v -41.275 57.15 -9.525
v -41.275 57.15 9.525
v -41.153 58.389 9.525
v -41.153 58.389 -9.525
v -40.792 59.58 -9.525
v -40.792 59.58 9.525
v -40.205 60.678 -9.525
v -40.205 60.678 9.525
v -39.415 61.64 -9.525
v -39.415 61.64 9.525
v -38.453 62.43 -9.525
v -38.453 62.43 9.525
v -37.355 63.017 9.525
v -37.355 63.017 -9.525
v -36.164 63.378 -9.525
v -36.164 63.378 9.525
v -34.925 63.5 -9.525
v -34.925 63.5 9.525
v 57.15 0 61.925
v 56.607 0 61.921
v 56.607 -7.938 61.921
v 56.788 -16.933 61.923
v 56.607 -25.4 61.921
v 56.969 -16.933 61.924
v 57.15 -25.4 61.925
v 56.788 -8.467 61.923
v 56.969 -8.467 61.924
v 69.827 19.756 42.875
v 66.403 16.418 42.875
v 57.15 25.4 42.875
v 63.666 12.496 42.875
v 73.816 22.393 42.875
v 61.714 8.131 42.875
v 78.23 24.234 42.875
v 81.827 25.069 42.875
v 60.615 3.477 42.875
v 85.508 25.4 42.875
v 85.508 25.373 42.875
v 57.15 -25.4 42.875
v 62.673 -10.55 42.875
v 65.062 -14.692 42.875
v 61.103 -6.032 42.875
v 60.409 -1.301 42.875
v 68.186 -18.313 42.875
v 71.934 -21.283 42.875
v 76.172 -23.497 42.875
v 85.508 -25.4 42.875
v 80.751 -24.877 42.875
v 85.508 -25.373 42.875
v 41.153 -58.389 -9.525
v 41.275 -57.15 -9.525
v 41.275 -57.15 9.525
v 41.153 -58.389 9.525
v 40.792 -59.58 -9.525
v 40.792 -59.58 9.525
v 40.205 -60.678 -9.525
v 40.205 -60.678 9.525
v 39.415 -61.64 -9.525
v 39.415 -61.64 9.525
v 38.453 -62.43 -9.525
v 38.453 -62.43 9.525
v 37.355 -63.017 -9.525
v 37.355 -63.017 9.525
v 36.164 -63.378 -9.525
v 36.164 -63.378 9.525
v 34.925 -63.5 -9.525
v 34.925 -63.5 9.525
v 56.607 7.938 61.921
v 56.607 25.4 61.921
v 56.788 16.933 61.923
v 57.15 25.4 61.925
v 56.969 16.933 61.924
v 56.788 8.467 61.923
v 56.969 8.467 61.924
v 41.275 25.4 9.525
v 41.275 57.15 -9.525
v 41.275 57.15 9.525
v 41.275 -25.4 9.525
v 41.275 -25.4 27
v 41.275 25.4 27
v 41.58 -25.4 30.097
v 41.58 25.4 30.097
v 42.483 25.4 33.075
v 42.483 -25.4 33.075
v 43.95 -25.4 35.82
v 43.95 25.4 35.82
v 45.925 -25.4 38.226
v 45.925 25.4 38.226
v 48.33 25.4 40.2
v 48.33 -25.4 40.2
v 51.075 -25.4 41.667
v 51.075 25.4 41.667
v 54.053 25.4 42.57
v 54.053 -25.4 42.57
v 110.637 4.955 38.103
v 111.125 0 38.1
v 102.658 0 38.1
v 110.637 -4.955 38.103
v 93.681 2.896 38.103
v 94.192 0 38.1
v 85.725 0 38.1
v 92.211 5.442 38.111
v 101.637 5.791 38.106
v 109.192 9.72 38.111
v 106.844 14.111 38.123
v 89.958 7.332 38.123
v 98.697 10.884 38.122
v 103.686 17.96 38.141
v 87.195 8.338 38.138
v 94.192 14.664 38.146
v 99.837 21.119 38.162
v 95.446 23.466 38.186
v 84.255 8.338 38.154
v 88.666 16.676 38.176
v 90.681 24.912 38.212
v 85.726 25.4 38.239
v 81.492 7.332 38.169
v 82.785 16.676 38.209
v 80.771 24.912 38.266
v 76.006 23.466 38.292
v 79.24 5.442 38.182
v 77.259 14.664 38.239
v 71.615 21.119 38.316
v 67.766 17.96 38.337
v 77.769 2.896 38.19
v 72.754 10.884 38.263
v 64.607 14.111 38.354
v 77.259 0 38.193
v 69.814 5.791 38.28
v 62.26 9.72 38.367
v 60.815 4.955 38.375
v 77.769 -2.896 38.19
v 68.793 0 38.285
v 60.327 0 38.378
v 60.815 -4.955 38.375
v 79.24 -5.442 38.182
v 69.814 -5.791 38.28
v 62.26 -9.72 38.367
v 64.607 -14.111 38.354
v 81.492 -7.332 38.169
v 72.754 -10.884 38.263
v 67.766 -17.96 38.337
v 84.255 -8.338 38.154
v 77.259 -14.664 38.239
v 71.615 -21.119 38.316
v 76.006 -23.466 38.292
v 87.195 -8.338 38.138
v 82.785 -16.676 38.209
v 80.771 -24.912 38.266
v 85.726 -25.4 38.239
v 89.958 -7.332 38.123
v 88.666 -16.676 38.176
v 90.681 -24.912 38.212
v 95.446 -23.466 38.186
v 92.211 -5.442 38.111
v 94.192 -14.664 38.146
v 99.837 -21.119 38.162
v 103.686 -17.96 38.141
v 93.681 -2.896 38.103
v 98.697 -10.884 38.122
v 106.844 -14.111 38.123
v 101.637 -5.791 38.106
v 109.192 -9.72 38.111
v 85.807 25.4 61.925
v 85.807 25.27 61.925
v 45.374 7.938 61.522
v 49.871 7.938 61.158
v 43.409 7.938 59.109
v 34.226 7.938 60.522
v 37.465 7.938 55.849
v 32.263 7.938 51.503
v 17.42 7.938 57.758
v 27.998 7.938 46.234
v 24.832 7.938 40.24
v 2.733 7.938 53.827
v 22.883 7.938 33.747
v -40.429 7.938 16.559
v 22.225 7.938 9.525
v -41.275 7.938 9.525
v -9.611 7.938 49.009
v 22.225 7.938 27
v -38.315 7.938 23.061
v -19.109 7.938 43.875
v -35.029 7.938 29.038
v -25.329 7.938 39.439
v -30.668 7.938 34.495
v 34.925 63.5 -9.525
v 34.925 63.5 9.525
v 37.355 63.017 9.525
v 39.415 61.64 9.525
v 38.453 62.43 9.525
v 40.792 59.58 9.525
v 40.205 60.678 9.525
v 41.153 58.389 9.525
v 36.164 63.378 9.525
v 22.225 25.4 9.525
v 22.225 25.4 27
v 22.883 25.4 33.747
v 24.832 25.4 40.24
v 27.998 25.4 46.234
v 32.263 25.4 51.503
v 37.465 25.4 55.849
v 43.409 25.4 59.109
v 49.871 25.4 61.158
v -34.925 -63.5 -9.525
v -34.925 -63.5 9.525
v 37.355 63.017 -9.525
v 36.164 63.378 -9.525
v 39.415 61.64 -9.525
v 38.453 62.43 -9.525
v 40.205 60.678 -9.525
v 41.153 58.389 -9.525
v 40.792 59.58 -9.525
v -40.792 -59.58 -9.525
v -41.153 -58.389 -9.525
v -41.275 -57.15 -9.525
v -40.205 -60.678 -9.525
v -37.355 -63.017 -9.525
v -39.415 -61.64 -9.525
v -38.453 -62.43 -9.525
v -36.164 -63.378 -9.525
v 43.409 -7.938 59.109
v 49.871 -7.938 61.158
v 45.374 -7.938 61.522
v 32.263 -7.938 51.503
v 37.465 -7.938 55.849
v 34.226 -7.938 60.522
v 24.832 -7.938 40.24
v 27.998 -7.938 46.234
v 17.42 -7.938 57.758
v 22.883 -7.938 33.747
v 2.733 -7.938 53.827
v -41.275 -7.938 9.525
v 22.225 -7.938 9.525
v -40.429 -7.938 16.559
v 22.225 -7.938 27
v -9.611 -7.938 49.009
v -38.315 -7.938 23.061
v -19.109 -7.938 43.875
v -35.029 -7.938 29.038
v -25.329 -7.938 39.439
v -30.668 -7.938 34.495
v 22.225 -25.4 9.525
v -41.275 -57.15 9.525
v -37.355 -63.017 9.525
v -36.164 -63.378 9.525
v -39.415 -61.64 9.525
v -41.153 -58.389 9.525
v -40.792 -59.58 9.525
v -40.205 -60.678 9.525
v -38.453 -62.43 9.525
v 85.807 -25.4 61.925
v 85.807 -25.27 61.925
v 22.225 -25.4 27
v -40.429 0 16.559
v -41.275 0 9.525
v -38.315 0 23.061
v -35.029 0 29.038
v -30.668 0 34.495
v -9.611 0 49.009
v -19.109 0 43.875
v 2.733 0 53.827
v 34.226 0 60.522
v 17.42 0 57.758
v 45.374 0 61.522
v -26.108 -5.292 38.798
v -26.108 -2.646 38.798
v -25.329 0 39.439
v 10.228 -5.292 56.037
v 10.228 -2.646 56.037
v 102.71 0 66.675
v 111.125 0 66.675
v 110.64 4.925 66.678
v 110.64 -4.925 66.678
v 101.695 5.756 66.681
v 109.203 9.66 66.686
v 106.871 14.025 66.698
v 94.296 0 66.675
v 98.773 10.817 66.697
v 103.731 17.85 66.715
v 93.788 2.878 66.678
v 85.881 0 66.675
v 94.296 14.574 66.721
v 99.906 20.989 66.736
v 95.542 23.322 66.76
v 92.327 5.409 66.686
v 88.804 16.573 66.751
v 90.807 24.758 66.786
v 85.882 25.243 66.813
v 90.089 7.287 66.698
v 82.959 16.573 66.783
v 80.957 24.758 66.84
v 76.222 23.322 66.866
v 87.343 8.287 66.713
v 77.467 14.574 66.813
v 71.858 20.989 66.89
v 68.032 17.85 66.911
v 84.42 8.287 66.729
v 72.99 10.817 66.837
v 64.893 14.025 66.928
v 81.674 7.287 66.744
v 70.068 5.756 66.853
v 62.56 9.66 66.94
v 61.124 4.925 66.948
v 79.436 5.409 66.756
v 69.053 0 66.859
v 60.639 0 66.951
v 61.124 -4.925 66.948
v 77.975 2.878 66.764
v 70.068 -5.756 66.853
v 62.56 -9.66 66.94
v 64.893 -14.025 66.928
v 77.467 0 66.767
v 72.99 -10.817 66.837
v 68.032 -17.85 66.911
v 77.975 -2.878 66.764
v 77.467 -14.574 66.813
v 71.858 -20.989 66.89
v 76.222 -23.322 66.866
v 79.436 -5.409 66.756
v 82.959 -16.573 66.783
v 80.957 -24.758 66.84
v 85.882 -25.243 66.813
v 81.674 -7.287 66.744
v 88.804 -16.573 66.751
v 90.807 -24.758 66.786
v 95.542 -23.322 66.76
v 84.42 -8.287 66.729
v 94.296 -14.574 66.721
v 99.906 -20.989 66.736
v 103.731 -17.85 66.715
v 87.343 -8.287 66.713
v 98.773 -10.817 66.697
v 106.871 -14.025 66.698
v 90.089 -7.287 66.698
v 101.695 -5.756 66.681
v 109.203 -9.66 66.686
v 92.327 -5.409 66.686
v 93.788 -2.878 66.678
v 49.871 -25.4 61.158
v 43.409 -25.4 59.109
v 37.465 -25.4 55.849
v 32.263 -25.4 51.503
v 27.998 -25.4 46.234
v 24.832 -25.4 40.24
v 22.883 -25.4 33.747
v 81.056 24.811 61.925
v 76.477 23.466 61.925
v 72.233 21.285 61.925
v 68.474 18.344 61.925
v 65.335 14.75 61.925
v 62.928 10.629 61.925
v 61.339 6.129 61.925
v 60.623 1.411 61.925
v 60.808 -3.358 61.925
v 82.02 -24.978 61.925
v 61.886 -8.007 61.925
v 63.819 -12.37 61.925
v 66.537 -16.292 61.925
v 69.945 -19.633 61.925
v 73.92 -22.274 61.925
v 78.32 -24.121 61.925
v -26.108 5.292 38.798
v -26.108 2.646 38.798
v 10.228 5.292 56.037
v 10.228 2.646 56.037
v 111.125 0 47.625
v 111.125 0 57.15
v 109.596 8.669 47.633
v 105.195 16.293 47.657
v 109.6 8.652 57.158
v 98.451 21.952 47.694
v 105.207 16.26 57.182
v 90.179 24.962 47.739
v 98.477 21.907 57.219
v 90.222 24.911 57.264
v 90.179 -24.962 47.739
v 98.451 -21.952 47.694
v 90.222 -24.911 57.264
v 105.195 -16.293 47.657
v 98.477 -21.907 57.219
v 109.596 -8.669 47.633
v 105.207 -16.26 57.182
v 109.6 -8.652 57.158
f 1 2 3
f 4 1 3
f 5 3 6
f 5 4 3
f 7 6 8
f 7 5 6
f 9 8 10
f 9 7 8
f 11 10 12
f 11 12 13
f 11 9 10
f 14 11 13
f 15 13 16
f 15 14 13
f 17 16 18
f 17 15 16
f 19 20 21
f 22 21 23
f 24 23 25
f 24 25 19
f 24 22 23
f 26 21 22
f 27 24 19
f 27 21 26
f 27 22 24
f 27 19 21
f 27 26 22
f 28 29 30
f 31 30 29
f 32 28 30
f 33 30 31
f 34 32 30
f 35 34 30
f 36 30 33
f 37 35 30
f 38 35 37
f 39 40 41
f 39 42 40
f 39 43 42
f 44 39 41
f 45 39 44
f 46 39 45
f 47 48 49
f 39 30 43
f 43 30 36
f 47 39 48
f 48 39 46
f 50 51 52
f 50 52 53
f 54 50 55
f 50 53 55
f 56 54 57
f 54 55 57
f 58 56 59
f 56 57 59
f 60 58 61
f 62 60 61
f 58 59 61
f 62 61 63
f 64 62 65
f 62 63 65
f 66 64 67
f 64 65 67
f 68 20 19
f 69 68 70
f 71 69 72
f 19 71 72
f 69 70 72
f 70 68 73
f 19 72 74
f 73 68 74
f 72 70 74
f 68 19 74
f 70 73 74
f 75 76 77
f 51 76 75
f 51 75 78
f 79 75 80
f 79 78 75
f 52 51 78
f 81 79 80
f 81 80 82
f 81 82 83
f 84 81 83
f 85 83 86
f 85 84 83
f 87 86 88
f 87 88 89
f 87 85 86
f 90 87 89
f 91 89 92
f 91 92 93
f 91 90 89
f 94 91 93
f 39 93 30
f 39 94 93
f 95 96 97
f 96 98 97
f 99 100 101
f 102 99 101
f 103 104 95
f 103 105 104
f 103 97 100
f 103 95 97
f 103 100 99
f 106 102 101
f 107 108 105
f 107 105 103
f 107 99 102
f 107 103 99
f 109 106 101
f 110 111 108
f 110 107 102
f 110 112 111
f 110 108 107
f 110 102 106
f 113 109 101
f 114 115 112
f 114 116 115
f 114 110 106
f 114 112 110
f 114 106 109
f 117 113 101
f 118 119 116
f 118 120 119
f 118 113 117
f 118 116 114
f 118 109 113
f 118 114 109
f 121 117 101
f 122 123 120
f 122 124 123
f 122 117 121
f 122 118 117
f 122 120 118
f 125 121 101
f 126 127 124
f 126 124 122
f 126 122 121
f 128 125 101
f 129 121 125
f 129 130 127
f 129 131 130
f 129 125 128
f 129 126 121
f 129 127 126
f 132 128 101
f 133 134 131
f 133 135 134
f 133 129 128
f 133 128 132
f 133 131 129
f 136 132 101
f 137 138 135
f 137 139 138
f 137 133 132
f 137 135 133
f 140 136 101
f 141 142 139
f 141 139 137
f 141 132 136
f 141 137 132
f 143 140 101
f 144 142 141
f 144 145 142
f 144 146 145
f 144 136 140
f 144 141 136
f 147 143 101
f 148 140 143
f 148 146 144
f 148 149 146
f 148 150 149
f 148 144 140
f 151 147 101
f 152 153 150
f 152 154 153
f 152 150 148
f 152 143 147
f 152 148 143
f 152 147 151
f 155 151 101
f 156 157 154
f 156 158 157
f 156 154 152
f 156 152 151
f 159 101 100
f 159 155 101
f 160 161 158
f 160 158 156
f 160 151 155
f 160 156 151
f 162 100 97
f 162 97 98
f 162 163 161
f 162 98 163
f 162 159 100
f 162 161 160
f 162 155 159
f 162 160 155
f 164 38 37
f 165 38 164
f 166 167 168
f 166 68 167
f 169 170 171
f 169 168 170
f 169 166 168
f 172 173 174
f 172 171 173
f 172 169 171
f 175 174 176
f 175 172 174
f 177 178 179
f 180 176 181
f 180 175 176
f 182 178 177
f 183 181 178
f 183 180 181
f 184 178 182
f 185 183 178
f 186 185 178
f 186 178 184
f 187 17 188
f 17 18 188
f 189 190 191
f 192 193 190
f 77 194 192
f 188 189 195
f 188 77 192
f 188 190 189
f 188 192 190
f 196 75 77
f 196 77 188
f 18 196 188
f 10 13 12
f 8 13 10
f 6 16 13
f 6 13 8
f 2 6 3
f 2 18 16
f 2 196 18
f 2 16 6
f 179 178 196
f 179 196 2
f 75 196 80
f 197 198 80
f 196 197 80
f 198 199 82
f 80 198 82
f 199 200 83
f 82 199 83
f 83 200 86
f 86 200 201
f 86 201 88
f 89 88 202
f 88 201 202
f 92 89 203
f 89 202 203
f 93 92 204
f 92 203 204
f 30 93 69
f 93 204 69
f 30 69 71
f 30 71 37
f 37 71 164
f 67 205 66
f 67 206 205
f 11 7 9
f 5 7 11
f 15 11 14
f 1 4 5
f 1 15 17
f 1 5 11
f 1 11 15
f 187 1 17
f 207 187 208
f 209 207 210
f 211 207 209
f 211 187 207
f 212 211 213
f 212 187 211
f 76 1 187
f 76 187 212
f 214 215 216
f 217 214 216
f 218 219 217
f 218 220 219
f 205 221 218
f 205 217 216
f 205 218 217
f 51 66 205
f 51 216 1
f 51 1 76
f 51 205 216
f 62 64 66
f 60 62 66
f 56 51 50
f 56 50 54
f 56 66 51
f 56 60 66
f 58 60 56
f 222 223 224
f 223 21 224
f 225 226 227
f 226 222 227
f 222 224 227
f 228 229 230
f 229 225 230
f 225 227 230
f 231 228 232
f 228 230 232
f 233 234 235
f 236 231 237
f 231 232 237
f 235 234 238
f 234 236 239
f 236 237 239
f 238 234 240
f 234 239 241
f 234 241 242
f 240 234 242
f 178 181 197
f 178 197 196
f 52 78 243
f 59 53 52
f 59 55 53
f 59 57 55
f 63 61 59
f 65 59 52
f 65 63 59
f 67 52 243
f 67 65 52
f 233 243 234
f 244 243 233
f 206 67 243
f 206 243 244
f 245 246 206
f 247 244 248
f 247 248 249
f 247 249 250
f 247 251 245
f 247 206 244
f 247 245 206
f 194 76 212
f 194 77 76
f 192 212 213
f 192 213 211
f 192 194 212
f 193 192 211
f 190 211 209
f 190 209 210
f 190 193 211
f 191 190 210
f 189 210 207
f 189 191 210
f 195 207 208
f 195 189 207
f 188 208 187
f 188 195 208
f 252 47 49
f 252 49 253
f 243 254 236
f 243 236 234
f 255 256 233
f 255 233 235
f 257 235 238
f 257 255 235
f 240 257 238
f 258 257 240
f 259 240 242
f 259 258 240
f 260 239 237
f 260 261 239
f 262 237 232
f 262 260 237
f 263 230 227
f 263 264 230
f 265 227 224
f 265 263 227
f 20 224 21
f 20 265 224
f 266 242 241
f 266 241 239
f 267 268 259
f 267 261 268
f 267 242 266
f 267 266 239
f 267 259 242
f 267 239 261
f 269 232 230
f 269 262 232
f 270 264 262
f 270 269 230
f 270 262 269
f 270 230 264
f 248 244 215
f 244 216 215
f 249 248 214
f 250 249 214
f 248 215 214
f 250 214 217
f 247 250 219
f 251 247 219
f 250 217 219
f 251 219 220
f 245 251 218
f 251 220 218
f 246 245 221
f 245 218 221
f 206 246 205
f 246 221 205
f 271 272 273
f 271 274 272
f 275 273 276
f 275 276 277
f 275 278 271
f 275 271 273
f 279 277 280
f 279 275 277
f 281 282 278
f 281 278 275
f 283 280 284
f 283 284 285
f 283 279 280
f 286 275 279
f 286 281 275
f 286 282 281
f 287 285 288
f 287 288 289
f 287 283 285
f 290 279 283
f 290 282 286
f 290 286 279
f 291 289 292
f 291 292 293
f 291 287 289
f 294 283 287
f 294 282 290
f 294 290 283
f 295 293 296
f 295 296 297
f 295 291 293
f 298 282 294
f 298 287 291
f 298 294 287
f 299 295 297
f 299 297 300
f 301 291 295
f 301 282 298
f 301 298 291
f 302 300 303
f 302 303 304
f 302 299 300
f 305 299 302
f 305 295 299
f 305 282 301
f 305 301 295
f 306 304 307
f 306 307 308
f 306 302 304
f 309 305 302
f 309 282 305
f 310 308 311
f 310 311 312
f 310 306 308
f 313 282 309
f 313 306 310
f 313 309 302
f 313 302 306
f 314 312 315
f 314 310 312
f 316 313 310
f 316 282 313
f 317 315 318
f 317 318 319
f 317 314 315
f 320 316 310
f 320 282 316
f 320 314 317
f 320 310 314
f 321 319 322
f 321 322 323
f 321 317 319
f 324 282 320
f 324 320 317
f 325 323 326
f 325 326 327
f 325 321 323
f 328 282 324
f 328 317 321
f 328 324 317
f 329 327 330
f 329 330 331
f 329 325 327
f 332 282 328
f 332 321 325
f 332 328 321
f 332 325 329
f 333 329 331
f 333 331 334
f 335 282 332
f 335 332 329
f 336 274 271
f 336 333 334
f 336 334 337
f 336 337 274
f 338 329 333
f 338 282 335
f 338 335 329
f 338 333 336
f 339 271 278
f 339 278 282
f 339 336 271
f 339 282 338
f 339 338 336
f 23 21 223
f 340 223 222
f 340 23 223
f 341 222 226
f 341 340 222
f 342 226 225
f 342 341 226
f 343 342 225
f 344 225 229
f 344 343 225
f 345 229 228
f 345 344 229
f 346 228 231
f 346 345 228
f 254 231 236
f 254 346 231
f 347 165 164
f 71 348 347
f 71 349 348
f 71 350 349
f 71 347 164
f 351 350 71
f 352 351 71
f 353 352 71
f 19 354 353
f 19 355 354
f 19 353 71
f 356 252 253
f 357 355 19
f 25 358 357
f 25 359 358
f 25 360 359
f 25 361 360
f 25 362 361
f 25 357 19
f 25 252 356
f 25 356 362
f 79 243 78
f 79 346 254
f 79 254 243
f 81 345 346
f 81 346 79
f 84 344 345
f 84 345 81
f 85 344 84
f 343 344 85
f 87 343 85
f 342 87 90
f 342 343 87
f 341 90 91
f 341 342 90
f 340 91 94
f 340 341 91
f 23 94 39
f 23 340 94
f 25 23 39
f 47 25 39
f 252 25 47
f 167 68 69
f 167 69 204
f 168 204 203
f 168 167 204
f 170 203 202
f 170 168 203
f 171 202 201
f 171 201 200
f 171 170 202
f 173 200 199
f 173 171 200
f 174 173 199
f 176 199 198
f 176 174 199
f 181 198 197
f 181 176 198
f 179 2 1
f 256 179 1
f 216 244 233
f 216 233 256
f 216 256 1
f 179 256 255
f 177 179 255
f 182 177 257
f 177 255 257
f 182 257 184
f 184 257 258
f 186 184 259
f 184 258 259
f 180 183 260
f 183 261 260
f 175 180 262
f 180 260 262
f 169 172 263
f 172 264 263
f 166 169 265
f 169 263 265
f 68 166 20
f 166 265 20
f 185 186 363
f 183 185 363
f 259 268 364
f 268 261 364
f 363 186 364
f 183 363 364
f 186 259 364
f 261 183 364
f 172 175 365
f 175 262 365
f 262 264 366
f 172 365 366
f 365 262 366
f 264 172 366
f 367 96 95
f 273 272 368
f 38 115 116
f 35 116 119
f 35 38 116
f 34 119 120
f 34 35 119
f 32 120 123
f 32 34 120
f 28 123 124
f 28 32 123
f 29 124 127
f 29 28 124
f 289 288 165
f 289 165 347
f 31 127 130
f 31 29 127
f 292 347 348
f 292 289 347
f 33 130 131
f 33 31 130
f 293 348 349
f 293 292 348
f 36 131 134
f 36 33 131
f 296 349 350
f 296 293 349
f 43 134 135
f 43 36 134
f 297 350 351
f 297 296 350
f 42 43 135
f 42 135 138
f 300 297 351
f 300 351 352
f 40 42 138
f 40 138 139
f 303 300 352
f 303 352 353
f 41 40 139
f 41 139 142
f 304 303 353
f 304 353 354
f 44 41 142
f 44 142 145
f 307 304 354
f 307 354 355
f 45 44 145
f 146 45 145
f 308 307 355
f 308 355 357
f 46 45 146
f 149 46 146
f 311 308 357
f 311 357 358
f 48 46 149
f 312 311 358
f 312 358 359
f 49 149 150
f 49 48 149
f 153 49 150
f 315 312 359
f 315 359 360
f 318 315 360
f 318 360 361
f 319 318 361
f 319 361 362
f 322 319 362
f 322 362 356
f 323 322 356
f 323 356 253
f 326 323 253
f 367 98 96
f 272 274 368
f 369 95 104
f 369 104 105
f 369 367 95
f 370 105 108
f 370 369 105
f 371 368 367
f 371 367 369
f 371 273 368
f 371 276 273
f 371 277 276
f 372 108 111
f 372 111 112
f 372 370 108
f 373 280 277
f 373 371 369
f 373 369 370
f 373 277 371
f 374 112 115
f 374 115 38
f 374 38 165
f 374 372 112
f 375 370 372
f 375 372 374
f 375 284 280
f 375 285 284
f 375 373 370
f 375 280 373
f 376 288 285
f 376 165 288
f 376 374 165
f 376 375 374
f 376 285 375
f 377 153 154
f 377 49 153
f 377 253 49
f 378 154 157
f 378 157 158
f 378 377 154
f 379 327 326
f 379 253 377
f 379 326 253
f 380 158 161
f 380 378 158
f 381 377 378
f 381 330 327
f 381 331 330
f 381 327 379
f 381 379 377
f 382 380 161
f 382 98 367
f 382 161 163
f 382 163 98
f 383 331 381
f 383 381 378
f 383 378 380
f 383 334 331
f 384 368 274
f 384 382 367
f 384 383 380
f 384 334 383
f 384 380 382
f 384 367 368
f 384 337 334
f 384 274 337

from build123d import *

# Parameters (mm, degrees)
F1_DEPTH = 63.5
F2_DEPTH = 25.4
F3_DEPTH = 7.9375
F5_R     = 6.35


with BuildPart() as f1:
    # F0 (on Front) → F1 (new body, symmetric)
    with BuildSketch(Plane.XZ):
        Polygon((-41.275, -9.525), (41.275, -9.525), (41.275, 9.525), (22.225, 9.525), (-41.275, 9.525), align=None)
    extrude(amount=F1_DEPTH, both=True)

    # F0 (on Front) → F2 (join, symmetric)
    with BuildSketch(Plane.XZ):
        with BuildLine():
            Line((22.225, 9.525), (41.275, 9.525))
            Line((41.275, 9.525), (41.275, 27.0002))
            ThreePointArc((41.275, 27.0002), (45.9246798487, 38.2255201513), (57.15, 42.8752))
            Line((57.15, 42.8752), (60.325, 42.8752))
            Line((60.325, 42.8752), (60.325, 61.9252))
            Line((60.325, 61.9252), (57.15, 61.9252))
            add(Edge.make_bspline(
                [(56.6065115884, 61.920970973), (56.7876987986, 61.922611789), (56.9688625178, 61.9240214089), (57.15, 61.9252)],
                knots=[111.0825046513, 111.0825046513, 111.0825046513, 111.0825046513, 111.5045361635, 111.5045361635, 111.5045361635, 111.5045361635], degree=3))
            ThreePointArc((56.6065115884, 61.920970973), (32.262885284, 51.5029987404), (22.225, 27.0002))
            Line((22.225, 27.0002), (22.225, 9.525))
        make_face()
        Polygon((60.325, 61.9252), (60.325, 42.8752), (85.5075716972, 42.8752), (85.8066127165, 61.9252), align=None)
    extrude(amount=F2_DEPTH, both=True)

    # F0 (on Front) → F3 (join, symmetric)
    with BuildSketch(Plane.XZ):
        with BuildLine():
            add(Edge.make_bspline(
                [(-41.275, 9.525), (-40.4011428689, 45.0401850248), (8.9164018698, 61.4890933851), (56.6065115884, 61.920970973)],
                knots=[0, 0, 0, 0, 111.0825046513, 111.0825046513, 111.0825046513, 111.0825046513], degree=3))
            Line((-41.275, 9.525), (22.225, 9.525))
            Line((22.225, 9.525), (22.225, 27.0002))
            ThreePointArc((22.225, 27.0002), (32.262885284, 51.5029987404), (56.6065115884, 61.920970973))
        make_face()
    extrude(amount=F3_DEPTH, both=True)

    # F0 (on Front) → F4 (revolve)
    with BuildSketch(Plane.XZ):
        Polygon((85.8552140861, 61.9252), (85.725, 38.1), (111.125, 38.1), (111.125, 66.675), (85.8811736107, 66.675), align=None)
    revolve(axis=Axis((85.8030868053, 0, 52.3875), (0.0054653116, 0, 0.9999850651)))

    # F5
    f5_edges = [f1.edges().sort_by_distance(p)[0] for p in [
        (41.275, -63.5, 0),
        (-41.275, -63.5, 0),
        (-41.275, 63.5, 0),
        (41.275, 63.5, 0),
    ]]
    fillet(f5_edges, radius=F5_R)


solid = f1.part
